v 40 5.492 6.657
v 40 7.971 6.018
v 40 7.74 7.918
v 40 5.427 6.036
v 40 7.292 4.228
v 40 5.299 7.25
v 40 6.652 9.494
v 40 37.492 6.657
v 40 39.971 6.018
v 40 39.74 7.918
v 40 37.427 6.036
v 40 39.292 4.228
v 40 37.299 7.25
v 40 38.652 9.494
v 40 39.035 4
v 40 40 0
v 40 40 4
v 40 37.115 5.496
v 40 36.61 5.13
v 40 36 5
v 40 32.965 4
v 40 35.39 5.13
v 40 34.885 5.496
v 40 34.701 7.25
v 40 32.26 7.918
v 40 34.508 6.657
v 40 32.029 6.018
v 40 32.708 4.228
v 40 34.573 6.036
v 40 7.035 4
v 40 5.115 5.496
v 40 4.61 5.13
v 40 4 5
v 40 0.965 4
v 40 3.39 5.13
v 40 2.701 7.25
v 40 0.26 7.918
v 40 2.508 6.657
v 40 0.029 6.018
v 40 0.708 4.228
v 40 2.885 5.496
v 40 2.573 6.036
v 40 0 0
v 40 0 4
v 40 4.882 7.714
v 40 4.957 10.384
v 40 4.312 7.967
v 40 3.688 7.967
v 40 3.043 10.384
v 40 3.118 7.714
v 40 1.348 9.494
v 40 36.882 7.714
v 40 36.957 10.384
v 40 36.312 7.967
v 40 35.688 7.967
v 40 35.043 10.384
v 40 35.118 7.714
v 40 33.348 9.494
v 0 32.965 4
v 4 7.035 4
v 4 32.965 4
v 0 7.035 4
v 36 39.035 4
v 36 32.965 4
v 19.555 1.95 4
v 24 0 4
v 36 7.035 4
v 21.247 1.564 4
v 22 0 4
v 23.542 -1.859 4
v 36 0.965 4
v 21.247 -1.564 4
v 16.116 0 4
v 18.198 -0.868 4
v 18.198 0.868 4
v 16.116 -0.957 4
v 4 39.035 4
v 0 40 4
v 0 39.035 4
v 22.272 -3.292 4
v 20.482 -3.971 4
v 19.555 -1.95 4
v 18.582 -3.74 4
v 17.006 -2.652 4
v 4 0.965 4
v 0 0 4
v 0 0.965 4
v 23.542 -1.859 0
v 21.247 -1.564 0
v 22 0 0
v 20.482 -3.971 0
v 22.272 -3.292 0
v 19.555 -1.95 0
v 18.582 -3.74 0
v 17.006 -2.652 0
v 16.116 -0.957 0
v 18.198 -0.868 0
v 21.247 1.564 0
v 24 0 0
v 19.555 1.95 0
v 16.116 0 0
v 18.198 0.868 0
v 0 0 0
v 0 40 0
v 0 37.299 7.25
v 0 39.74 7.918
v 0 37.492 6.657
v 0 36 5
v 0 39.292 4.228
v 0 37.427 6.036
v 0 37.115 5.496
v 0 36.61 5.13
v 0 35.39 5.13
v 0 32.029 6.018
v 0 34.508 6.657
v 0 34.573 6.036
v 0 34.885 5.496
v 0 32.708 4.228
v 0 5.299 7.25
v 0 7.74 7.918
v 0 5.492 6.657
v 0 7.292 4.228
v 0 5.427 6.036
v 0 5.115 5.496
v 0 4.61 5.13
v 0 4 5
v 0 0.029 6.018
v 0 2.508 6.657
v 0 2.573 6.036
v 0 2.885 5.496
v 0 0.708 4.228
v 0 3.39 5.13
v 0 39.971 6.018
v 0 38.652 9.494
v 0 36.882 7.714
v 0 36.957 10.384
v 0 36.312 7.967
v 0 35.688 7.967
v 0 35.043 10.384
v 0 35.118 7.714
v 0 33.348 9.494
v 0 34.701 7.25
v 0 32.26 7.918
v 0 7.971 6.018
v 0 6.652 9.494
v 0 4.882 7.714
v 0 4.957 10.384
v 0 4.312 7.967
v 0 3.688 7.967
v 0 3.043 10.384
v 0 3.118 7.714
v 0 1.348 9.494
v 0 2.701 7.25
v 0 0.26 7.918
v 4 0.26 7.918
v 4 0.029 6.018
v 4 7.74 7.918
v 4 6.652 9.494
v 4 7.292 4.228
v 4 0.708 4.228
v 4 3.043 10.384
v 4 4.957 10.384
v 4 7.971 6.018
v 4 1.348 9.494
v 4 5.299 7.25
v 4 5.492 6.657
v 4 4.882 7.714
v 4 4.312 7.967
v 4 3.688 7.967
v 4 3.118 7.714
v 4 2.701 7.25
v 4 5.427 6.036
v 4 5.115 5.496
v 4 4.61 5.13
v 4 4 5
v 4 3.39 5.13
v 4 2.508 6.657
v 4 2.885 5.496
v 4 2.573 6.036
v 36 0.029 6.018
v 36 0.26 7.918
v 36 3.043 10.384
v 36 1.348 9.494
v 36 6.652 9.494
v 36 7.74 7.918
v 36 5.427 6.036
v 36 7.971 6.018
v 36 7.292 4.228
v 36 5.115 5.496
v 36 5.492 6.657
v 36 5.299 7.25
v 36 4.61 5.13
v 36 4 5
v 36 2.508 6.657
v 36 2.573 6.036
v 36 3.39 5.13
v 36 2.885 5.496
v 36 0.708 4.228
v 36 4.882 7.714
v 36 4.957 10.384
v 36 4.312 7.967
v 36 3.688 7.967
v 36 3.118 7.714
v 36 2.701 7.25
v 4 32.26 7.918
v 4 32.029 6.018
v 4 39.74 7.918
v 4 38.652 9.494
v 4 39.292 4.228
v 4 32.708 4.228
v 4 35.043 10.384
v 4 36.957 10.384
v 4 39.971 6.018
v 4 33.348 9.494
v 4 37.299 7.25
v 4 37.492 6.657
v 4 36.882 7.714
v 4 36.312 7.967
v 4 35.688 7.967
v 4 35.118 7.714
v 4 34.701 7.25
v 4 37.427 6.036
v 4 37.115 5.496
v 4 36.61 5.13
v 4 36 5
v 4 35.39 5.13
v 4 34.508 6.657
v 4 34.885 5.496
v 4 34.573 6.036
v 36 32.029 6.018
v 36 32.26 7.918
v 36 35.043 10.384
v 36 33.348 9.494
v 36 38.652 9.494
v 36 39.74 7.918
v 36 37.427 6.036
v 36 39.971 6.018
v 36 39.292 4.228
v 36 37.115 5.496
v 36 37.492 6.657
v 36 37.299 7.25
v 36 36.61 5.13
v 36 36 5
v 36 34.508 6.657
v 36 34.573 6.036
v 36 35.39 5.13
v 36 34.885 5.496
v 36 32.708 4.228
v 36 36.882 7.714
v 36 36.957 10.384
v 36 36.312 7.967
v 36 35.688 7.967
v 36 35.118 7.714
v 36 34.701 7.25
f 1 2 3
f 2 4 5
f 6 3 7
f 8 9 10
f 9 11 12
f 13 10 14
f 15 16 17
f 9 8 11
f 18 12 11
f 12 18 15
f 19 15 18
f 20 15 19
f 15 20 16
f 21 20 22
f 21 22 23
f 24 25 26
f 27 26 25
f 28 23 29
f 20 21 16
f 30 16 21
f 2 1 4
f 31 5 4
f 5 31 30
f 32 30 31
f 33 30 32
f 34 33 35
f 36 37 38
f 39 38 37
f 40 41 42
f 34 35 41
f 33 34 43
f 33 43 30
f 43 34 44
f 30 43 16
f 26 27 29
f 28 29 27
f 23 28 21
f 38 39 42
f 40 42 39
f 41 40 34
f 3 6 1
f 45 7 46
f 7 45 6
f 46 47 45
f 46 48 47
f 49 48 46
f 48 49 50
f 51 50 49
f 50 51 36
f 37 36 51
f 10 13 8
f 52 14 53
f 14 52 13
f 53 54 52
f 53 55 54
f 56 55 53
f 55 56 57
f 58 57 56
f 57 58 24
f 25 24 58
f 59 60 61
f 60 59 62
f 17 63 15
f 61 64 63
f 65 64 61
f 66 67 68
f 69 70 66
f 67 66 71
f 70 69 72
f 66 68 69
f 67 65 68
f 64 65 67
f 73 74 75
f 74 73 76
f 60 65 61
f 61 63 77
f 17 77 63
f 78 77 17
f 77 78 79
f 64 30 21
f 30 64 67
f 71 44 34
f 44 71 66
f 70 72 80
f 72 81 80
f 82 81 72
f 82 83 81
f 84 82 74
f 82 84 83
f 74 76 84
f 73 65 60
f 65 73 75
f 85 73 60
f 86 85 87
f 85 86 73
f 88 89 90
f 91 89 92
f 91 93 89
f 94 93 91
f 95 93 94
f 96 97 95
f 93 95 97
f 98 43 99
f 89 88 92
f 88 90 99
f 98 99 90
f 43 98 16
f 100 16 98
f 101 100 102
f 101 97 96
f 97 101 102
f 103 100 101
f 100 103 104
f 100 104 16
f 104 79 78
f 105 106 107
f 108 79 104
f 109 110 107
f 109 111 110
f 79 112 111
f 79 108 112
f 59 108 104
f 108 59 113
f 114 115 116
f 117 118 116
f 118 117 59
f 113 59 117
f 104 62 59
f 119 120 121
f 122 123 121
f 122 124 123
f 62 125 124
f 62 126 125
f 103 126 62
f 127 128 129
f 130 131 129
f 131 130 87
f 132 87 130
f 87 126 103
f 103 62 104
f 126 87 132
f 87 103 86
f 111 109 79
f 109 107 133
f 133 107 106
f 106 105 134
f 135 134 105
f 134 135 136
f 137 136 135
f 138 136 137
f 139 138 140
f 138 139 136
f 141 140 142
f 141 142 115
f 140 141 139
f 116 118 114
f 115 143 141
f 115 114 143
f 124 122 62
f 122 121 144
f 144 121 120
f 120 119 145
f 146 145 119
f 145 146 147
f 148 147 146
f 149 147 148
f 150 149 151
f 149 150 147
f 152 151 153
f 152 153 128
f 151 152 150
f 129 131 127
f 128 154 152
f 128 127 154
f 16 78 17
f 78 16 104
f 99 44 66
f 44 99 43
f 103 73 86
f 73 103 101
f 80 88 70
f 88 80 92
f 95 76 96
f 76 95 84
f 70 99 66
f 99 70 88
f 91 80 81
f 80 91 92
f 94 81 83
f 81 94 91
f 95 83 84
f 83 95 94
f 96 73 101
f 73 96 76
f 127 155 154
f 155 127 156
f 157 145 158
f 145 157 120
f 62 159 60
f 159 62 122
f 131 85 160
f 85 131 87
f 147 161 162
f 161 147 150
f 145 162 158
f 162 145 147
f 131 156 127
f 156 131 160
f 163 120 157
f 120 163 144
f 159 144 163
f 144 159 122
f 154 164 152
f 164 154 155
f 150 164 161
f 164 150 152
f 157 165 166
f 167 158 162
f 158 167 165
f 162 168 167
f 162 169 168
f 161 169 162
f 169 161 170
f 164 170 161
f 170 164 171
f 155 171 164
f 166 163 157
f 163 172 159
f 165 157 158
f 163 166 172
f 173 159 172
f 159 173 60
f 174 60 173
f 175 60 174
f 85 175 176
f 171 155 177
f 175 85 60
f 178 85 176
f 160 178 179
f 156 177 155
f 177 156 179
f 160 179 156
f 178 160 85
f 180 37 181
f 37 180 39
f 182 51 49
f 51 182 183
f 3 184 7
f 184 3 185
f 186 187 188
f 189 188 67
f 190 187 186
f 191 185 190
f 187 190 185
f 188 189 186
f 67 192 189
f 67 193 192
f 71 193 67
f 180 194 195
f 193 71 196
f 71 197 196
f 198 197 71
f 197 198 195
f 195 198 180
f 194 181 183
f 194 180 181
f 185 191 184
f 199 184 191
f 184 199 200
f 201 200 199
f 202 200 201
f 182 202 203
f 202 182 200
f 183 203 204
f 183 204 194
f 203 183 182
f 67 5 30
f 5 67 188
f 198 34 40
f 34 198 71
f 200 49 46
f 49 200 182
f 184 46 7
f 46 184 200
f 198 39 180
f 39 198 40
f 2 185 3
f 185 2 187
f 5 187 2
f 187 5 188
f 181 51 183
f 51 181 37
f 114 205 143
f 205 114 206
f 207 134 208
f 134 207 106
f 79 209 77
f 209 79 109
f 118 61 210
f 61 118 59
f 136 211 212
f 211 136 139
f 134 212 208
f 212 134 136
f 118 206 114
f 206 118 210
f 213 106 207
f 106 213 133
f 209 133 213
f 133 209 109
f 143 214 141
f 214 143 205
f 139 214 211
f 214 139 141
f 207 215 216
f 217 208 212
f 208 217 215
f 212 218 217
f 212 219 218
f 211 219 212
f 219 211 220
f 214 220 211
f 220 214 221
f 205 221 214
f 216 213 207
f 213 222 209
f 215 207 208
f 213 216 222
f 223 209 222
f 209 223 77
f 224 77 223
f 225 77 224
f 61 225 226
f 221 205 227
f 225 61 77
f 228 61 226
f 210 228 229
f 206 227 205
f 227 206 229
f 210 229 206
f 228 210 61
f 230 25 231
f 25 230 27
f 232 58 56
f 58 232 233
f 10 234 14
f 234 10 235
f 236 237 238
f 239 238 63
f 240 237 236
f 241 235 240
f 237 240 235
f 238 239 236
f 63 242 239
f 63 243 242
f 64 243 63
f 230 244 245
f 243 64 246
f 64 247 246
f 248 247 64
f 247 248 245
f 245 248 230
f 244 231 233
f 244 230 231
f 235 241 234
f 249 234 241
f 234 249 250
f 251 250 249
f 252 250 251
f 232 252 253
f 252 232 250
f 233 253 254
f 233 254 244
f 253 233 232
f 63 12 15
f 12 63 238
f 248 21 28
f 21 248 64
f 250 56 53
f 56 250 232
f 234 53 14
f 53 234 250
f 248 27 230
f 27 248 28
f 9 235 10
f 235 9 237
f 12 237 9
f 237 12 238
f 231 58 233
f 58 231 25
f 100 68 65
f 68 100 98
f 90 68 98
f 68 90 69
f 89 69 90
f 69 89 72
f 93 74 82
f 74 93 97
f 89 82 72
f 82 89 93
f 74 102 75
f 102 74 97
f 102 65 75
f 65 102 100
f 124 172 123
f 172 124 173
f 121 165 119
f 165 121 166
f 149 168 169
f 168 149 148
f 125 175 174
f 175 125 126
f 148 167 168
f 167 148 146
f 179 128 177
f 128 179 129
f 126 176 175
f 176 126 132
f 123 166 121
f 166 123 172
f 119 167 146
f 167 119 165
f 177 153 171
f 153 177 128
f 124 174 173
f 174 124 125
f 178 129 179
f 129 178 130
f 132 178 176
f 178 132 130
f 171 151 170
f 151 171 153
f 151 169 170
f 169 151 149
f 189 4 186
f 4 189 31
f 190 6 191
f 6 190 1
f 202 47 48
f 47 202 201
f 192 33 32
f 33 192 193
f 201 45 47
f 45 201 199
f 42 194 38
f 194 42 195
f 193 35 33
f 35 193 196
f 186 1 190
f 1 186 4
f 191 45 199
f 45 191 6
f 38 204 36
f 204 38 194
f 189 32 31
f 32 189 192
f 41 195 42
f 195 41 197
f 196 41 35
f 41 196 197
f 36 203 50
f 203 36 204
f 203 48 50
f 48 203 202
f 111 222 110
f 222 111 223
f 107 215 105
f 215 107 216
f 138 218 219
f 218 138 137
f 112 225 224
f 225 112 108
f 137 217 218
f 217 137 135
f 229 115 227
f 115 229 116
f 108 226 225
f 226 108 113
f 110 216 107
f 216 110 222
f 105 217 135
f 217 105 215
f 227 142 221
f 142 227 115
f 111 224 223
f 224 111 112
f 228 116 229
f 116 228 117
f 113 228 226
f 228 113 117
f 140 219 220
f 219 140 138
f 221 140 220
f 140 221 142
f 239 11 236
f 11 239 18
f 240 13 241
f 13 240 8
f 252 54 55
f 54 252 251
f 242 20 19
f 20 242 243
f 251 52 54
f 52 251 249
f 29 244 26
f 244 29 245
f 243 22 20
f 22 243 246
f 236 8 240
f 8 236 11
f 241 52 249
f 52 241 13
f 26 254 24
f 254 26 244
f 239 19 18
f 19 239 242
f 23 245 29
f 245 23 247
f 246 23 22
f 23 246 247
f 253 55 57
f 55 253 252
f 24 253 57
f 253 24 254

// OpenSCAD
difference(){
    union(){
        cube([40,40,4]);
        translate([20,0,0]) cylinder(4,4,4);
        
        translate([0,4,6.5]) rotate([0,90,0]) cylinder(4,4,4);
        translate([40-4,4,6.5]) rotate([0,90,0]) cylinder(4,4,4);
        translate([0,40-4,6.5]) rotate([0,90,0]) cylinder(4,4,4);
        translate([40-4,40-4,6.5]) rotate([0,90,0]) cylinder(4,4,4);
   
    };
    union(){
        translate([20,0,0]) cylinder(4,2,2);
        translate([0,4,6.5]) rotate([0,90,0]) cylinder(4,1.5,1.5,$fn=15);
        translate([40-4,4,6.5]) rotate([0,90,0]) cylinder(4,1.5,1.5,$fn=15);
        translate([0,40-4,6.5]) rotate([0,90,0]) cylinder(4,1.5,1.5,$fn=15);
        translate([40-4,40-4,6.5]) rotate([0,90,0]) cylinder(4,1.5,1.5,$fn=15);
    };
};
